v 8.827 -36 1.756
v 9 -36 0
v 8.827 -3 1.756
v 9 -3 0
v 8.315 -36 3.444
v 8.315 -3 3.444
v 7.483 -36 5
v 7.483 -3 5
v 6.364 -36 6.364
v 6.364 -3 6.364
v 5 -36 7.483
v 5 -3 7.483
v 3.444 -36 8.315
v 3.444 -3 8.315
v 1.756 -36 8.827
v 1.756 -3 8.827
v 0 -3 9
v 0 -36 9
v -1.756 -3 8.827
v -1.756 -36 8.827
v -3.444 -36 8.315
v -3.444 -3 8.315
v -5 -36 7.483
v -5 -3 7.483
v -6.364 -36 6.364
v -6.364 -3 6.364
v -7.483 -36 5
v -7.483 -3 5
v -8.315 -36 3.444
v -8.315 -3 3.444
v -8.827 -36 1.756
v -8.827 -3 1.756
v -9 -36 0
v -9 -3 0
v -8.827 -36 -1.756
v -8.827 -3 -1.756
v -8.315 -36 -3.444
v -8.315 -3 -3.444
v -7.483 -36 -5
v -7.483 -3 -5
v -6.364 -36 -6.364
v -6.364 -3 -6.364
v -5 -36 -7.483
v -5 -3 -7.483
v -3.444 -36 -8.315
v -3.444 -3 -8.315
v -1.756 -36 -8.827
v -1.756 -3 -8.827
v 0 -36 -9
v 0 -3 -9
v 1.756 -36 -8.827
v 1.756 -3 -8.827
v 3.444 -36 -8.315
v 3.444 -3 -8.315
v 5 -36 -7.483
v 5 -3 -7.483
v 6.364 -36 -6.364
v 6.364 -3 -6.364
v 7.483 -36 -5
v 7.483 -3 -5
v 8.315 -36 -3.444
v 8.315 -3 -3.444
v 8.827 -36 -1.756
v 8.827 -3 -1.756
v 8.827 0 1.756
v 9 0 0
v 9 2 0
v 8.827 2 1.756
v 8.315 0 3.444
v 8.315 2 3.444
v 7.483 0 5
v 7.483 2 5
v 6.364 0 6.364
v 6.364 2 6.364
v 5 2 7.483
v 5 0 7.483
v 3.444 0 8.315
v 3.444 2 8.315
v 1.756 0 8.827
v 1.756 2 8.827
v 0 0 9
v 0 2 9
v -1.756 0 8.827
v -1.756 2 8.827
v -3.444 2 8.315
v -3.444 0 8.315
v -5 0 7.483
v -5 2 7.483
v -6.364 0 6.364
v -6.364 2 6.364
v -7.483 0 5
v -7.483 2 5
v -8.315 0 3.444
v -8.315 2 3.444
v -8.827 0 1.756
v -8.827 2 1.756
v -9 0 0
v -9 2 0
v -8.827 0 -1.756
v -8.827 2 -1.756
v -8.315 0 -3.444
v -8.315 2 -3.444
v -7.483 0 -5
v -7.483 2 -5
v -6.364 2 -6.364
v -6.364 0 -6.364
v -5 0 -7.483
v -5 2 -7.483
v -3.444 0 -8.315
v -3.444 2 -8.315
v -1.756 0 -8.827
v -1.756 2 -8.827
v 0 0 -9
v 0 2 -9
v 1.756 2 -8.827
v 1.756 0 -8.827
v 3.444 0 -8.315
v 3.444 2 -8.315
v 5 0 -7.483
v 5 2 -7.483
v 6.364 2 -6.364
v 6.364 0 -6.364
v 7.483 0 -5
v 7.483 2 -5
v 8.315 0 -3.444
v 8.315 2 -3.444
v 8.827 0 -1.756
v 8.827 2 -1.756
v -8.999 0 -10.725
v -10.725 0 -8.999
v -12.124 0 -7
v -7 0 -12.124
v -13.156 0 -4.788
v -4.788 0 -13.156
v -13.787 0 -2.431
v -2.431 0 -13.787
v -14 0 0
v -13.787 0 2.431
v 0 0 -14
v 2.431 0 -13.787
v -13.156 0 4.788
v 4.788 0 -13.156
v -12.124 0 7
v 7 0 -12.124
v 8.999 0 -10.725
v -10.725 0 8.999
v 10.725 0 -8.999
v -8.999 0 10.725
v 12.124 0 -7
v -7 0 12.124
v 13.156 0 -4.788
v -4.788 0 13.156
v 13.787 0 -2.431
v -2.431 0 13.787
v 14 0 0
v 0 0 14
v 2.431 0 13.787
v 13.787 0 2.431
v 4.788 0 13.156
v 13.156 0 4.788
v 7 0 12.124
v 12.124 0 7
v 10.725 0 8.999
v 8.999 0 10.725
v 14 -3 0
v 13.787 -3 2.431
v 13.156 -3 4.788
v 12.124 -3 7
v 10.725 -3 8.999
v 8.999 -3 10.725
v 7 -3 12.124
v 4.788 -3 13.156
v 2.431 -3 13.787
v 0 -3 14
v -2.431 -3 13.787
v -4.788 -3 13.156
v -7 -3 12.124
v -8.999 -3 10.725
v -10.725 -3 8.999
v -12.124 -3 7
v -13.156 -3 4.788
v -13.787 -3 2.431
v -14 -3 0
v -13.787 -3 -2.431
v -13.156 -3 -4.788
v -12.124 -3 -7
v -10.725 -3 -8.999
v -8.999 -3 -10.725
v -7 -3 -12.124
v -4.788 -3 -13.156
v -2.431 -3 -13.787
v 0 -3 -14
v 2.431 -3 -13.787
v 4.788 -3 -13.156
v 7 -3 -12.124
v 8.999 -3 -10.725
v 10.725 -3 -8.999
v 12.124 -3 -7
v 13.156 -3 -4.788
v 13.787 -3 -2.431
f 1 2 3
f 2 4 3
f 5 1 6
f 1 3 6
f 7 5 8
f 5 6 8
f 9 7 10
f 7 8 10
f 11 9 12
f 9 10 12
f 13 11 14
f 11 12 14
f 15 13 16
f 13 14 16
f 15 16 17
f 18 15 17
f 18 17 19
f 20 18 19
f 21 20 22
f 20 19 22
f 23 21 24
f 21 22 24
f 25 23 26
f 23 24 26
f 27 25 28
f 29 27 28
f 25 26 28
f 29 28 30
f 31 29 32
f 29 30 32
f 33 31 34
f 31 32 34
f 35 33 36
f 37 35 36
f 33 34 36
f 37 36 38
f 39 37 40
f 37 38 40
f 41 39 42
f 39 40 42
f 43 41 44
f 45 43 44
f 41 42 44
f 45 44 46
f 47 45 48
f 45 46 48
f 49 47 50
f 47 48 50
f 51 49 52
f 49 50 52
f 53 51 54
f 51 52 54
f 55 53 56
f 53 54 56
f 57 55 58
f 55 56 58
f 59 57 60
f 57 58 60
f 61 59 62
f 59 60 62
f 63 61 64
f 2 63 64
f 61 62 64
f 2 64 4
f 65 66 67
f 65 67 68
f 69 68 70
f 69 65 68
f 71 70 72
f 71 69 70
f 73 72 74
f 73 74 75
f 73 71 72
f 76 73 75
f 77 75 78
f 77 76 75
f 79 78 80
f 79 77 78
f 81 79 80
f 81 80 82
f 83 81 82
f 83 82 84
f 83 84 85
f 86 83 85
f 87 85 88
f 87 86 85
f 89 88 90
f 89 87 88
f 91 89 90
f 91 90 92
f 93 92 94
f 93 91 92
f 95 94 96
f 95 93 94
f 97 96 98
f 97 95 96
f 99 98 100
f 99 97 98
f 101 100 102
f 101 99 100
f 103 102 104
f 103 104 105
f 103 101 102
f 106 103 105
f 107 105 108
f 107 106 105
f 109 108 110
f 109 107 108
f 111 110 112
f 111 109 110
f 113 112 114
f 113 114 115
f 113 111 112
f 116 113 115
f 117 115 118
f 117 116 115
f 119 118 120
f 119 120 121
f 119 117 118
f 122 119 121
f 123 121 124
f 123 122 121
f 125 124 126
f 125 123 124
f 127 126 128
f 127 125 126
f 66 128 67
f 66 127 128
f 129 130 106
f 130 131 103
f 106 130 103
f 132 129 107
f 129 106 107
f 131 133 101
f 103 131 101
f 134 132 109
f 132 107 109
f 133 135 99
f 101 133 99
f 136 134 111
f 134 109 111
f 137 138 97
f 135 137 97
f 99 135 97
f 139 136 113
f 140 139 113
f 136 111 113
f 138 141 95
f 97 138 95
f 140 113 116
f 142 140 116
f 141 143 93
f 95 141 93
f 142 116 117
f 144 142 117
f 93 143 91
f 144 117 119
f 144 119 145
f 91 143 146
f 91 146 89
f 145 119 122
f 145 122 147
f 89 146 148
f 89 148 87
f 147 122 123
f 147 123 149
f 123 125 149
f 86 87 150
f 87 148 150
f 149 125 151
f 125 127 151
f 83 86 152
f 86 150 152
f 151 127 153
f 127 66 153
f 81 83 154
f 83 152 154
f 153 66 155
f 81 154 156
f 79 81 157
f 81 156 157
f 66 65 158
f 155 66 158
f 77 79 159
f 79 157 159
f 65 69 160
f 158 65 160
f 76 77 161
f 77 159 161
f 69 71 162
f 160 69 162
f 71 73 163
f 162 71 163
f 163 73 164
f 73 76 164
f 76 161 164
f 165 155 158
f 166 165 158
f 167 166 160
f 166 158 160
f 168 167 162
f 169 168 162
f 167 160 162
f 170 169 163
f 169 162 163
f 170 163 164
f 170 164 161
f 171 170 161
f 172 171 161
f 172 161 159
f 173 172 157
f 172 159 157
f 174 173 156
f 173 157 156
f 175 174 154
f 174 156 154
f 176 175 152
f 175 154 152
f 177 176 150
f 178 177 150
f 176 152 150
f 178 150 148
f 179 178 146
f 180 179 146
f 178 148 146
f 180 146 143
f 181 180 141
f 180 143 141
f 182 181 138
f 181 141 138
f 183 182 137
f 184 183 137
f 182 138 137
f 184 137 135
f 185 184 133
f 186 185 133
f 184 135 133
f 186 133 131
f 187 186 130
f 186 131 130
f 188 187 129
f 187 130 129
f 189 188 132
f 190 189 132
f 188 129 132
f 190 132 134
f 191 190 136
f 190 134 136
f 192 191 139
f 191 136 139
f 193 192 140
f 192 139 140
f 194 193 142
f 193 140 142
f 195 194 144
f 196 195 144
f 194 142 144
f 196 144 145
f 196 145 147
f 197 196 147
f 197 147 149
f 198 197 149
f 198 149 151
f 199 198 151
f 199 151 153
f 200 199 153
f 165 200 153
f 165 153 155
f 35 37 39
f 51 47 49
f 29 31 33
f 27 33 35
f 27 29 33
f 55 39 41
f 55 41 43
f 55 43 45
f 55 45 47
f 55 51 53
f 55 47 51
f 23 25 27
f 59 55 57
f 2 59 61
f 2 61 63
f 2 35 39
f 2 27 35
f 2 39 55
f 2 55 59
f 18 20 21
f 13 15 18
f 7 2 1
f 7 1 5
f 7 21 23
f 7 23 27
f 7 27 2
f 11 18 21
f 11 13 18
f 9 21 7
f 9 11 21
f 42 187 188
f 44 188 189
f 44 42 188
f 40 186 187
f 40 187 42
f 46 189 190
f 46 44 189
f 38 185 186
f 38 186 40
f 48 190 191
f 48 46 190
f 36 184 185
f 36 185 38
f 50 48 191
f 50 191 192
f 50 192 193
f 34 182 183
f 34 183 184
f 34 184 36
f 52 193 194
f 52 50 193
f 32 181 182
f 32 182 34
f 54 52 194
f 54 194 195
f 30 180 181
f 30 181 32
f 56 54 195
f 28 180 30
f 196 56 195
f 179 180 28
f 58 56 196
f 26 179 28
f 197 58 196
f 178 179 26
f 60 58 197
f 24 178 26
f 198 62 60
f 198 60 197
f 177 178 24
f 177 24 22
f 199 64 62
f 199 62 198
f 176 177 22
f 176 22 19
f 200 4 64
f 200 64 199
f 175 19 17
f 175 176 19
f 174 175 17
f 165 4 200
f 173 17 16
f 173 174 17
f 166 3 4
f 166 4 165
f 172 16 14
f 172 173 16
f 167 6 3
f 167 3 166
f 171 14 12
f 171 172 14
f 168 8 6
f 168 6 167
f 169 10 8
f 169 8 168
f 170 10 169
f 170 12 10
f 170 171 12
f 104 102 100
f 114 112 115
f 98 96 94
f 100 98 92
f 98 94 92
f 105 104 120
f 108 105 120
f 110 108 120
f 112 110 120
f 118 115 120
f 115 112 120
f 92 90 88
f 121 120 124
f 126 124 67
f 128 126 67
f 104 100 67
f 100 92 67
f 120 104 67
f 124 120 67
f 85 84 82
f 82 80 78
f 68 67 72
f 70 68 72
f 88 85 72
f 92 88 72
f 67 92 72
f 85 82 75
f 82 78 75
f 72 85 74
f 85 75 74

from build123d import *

# Parameters (mm, degrees)
F0_R     = 14
F0_R_2   = 9
F1_DEPTH = 3
F2_DEPTH = 27
F3_DEPTH = 2
F4_R     = 3.75
F5_DEPTH = 4
F7_R     = 9
F8_DEPTH = 9


with BuildPart() as f1:
    # F0 (on Front) → F1 (new body)
    with BuildSketch(Plane.XZ):
        Circle(F0_R)
        Circle(F0_R_2, mode=Mode.SUBTRACT)
        Circle(F0_R_2)
    extrude(amount=F1_DEPTH)

    # F0 (on Front) → F2 (join)
    with BuildSketch(Plane.XZ):
        Circle(F0_R_2)
    extrude(amount=F2_DEPTH)

    # F0 (on Front) → F3 (join)
    with BuildSketch(Plane.XZ):
        Circle(F0_R_2)
    extrude(amount=-F3_DEPTH)

    # F4 (on face) → F5 (join)
    with BuildSketch(Plane.XZ.offset(27)):
        Circle(F4_R)
    extrude(amount=F5_DEPTH)

    # F7 (on face) → F8 (join)
    with BuildSketch(Plane.XZ.offset(27)):
        Circle(F7_R)
    extrude(amount=F8_DEPTH)


solid = f1.part
